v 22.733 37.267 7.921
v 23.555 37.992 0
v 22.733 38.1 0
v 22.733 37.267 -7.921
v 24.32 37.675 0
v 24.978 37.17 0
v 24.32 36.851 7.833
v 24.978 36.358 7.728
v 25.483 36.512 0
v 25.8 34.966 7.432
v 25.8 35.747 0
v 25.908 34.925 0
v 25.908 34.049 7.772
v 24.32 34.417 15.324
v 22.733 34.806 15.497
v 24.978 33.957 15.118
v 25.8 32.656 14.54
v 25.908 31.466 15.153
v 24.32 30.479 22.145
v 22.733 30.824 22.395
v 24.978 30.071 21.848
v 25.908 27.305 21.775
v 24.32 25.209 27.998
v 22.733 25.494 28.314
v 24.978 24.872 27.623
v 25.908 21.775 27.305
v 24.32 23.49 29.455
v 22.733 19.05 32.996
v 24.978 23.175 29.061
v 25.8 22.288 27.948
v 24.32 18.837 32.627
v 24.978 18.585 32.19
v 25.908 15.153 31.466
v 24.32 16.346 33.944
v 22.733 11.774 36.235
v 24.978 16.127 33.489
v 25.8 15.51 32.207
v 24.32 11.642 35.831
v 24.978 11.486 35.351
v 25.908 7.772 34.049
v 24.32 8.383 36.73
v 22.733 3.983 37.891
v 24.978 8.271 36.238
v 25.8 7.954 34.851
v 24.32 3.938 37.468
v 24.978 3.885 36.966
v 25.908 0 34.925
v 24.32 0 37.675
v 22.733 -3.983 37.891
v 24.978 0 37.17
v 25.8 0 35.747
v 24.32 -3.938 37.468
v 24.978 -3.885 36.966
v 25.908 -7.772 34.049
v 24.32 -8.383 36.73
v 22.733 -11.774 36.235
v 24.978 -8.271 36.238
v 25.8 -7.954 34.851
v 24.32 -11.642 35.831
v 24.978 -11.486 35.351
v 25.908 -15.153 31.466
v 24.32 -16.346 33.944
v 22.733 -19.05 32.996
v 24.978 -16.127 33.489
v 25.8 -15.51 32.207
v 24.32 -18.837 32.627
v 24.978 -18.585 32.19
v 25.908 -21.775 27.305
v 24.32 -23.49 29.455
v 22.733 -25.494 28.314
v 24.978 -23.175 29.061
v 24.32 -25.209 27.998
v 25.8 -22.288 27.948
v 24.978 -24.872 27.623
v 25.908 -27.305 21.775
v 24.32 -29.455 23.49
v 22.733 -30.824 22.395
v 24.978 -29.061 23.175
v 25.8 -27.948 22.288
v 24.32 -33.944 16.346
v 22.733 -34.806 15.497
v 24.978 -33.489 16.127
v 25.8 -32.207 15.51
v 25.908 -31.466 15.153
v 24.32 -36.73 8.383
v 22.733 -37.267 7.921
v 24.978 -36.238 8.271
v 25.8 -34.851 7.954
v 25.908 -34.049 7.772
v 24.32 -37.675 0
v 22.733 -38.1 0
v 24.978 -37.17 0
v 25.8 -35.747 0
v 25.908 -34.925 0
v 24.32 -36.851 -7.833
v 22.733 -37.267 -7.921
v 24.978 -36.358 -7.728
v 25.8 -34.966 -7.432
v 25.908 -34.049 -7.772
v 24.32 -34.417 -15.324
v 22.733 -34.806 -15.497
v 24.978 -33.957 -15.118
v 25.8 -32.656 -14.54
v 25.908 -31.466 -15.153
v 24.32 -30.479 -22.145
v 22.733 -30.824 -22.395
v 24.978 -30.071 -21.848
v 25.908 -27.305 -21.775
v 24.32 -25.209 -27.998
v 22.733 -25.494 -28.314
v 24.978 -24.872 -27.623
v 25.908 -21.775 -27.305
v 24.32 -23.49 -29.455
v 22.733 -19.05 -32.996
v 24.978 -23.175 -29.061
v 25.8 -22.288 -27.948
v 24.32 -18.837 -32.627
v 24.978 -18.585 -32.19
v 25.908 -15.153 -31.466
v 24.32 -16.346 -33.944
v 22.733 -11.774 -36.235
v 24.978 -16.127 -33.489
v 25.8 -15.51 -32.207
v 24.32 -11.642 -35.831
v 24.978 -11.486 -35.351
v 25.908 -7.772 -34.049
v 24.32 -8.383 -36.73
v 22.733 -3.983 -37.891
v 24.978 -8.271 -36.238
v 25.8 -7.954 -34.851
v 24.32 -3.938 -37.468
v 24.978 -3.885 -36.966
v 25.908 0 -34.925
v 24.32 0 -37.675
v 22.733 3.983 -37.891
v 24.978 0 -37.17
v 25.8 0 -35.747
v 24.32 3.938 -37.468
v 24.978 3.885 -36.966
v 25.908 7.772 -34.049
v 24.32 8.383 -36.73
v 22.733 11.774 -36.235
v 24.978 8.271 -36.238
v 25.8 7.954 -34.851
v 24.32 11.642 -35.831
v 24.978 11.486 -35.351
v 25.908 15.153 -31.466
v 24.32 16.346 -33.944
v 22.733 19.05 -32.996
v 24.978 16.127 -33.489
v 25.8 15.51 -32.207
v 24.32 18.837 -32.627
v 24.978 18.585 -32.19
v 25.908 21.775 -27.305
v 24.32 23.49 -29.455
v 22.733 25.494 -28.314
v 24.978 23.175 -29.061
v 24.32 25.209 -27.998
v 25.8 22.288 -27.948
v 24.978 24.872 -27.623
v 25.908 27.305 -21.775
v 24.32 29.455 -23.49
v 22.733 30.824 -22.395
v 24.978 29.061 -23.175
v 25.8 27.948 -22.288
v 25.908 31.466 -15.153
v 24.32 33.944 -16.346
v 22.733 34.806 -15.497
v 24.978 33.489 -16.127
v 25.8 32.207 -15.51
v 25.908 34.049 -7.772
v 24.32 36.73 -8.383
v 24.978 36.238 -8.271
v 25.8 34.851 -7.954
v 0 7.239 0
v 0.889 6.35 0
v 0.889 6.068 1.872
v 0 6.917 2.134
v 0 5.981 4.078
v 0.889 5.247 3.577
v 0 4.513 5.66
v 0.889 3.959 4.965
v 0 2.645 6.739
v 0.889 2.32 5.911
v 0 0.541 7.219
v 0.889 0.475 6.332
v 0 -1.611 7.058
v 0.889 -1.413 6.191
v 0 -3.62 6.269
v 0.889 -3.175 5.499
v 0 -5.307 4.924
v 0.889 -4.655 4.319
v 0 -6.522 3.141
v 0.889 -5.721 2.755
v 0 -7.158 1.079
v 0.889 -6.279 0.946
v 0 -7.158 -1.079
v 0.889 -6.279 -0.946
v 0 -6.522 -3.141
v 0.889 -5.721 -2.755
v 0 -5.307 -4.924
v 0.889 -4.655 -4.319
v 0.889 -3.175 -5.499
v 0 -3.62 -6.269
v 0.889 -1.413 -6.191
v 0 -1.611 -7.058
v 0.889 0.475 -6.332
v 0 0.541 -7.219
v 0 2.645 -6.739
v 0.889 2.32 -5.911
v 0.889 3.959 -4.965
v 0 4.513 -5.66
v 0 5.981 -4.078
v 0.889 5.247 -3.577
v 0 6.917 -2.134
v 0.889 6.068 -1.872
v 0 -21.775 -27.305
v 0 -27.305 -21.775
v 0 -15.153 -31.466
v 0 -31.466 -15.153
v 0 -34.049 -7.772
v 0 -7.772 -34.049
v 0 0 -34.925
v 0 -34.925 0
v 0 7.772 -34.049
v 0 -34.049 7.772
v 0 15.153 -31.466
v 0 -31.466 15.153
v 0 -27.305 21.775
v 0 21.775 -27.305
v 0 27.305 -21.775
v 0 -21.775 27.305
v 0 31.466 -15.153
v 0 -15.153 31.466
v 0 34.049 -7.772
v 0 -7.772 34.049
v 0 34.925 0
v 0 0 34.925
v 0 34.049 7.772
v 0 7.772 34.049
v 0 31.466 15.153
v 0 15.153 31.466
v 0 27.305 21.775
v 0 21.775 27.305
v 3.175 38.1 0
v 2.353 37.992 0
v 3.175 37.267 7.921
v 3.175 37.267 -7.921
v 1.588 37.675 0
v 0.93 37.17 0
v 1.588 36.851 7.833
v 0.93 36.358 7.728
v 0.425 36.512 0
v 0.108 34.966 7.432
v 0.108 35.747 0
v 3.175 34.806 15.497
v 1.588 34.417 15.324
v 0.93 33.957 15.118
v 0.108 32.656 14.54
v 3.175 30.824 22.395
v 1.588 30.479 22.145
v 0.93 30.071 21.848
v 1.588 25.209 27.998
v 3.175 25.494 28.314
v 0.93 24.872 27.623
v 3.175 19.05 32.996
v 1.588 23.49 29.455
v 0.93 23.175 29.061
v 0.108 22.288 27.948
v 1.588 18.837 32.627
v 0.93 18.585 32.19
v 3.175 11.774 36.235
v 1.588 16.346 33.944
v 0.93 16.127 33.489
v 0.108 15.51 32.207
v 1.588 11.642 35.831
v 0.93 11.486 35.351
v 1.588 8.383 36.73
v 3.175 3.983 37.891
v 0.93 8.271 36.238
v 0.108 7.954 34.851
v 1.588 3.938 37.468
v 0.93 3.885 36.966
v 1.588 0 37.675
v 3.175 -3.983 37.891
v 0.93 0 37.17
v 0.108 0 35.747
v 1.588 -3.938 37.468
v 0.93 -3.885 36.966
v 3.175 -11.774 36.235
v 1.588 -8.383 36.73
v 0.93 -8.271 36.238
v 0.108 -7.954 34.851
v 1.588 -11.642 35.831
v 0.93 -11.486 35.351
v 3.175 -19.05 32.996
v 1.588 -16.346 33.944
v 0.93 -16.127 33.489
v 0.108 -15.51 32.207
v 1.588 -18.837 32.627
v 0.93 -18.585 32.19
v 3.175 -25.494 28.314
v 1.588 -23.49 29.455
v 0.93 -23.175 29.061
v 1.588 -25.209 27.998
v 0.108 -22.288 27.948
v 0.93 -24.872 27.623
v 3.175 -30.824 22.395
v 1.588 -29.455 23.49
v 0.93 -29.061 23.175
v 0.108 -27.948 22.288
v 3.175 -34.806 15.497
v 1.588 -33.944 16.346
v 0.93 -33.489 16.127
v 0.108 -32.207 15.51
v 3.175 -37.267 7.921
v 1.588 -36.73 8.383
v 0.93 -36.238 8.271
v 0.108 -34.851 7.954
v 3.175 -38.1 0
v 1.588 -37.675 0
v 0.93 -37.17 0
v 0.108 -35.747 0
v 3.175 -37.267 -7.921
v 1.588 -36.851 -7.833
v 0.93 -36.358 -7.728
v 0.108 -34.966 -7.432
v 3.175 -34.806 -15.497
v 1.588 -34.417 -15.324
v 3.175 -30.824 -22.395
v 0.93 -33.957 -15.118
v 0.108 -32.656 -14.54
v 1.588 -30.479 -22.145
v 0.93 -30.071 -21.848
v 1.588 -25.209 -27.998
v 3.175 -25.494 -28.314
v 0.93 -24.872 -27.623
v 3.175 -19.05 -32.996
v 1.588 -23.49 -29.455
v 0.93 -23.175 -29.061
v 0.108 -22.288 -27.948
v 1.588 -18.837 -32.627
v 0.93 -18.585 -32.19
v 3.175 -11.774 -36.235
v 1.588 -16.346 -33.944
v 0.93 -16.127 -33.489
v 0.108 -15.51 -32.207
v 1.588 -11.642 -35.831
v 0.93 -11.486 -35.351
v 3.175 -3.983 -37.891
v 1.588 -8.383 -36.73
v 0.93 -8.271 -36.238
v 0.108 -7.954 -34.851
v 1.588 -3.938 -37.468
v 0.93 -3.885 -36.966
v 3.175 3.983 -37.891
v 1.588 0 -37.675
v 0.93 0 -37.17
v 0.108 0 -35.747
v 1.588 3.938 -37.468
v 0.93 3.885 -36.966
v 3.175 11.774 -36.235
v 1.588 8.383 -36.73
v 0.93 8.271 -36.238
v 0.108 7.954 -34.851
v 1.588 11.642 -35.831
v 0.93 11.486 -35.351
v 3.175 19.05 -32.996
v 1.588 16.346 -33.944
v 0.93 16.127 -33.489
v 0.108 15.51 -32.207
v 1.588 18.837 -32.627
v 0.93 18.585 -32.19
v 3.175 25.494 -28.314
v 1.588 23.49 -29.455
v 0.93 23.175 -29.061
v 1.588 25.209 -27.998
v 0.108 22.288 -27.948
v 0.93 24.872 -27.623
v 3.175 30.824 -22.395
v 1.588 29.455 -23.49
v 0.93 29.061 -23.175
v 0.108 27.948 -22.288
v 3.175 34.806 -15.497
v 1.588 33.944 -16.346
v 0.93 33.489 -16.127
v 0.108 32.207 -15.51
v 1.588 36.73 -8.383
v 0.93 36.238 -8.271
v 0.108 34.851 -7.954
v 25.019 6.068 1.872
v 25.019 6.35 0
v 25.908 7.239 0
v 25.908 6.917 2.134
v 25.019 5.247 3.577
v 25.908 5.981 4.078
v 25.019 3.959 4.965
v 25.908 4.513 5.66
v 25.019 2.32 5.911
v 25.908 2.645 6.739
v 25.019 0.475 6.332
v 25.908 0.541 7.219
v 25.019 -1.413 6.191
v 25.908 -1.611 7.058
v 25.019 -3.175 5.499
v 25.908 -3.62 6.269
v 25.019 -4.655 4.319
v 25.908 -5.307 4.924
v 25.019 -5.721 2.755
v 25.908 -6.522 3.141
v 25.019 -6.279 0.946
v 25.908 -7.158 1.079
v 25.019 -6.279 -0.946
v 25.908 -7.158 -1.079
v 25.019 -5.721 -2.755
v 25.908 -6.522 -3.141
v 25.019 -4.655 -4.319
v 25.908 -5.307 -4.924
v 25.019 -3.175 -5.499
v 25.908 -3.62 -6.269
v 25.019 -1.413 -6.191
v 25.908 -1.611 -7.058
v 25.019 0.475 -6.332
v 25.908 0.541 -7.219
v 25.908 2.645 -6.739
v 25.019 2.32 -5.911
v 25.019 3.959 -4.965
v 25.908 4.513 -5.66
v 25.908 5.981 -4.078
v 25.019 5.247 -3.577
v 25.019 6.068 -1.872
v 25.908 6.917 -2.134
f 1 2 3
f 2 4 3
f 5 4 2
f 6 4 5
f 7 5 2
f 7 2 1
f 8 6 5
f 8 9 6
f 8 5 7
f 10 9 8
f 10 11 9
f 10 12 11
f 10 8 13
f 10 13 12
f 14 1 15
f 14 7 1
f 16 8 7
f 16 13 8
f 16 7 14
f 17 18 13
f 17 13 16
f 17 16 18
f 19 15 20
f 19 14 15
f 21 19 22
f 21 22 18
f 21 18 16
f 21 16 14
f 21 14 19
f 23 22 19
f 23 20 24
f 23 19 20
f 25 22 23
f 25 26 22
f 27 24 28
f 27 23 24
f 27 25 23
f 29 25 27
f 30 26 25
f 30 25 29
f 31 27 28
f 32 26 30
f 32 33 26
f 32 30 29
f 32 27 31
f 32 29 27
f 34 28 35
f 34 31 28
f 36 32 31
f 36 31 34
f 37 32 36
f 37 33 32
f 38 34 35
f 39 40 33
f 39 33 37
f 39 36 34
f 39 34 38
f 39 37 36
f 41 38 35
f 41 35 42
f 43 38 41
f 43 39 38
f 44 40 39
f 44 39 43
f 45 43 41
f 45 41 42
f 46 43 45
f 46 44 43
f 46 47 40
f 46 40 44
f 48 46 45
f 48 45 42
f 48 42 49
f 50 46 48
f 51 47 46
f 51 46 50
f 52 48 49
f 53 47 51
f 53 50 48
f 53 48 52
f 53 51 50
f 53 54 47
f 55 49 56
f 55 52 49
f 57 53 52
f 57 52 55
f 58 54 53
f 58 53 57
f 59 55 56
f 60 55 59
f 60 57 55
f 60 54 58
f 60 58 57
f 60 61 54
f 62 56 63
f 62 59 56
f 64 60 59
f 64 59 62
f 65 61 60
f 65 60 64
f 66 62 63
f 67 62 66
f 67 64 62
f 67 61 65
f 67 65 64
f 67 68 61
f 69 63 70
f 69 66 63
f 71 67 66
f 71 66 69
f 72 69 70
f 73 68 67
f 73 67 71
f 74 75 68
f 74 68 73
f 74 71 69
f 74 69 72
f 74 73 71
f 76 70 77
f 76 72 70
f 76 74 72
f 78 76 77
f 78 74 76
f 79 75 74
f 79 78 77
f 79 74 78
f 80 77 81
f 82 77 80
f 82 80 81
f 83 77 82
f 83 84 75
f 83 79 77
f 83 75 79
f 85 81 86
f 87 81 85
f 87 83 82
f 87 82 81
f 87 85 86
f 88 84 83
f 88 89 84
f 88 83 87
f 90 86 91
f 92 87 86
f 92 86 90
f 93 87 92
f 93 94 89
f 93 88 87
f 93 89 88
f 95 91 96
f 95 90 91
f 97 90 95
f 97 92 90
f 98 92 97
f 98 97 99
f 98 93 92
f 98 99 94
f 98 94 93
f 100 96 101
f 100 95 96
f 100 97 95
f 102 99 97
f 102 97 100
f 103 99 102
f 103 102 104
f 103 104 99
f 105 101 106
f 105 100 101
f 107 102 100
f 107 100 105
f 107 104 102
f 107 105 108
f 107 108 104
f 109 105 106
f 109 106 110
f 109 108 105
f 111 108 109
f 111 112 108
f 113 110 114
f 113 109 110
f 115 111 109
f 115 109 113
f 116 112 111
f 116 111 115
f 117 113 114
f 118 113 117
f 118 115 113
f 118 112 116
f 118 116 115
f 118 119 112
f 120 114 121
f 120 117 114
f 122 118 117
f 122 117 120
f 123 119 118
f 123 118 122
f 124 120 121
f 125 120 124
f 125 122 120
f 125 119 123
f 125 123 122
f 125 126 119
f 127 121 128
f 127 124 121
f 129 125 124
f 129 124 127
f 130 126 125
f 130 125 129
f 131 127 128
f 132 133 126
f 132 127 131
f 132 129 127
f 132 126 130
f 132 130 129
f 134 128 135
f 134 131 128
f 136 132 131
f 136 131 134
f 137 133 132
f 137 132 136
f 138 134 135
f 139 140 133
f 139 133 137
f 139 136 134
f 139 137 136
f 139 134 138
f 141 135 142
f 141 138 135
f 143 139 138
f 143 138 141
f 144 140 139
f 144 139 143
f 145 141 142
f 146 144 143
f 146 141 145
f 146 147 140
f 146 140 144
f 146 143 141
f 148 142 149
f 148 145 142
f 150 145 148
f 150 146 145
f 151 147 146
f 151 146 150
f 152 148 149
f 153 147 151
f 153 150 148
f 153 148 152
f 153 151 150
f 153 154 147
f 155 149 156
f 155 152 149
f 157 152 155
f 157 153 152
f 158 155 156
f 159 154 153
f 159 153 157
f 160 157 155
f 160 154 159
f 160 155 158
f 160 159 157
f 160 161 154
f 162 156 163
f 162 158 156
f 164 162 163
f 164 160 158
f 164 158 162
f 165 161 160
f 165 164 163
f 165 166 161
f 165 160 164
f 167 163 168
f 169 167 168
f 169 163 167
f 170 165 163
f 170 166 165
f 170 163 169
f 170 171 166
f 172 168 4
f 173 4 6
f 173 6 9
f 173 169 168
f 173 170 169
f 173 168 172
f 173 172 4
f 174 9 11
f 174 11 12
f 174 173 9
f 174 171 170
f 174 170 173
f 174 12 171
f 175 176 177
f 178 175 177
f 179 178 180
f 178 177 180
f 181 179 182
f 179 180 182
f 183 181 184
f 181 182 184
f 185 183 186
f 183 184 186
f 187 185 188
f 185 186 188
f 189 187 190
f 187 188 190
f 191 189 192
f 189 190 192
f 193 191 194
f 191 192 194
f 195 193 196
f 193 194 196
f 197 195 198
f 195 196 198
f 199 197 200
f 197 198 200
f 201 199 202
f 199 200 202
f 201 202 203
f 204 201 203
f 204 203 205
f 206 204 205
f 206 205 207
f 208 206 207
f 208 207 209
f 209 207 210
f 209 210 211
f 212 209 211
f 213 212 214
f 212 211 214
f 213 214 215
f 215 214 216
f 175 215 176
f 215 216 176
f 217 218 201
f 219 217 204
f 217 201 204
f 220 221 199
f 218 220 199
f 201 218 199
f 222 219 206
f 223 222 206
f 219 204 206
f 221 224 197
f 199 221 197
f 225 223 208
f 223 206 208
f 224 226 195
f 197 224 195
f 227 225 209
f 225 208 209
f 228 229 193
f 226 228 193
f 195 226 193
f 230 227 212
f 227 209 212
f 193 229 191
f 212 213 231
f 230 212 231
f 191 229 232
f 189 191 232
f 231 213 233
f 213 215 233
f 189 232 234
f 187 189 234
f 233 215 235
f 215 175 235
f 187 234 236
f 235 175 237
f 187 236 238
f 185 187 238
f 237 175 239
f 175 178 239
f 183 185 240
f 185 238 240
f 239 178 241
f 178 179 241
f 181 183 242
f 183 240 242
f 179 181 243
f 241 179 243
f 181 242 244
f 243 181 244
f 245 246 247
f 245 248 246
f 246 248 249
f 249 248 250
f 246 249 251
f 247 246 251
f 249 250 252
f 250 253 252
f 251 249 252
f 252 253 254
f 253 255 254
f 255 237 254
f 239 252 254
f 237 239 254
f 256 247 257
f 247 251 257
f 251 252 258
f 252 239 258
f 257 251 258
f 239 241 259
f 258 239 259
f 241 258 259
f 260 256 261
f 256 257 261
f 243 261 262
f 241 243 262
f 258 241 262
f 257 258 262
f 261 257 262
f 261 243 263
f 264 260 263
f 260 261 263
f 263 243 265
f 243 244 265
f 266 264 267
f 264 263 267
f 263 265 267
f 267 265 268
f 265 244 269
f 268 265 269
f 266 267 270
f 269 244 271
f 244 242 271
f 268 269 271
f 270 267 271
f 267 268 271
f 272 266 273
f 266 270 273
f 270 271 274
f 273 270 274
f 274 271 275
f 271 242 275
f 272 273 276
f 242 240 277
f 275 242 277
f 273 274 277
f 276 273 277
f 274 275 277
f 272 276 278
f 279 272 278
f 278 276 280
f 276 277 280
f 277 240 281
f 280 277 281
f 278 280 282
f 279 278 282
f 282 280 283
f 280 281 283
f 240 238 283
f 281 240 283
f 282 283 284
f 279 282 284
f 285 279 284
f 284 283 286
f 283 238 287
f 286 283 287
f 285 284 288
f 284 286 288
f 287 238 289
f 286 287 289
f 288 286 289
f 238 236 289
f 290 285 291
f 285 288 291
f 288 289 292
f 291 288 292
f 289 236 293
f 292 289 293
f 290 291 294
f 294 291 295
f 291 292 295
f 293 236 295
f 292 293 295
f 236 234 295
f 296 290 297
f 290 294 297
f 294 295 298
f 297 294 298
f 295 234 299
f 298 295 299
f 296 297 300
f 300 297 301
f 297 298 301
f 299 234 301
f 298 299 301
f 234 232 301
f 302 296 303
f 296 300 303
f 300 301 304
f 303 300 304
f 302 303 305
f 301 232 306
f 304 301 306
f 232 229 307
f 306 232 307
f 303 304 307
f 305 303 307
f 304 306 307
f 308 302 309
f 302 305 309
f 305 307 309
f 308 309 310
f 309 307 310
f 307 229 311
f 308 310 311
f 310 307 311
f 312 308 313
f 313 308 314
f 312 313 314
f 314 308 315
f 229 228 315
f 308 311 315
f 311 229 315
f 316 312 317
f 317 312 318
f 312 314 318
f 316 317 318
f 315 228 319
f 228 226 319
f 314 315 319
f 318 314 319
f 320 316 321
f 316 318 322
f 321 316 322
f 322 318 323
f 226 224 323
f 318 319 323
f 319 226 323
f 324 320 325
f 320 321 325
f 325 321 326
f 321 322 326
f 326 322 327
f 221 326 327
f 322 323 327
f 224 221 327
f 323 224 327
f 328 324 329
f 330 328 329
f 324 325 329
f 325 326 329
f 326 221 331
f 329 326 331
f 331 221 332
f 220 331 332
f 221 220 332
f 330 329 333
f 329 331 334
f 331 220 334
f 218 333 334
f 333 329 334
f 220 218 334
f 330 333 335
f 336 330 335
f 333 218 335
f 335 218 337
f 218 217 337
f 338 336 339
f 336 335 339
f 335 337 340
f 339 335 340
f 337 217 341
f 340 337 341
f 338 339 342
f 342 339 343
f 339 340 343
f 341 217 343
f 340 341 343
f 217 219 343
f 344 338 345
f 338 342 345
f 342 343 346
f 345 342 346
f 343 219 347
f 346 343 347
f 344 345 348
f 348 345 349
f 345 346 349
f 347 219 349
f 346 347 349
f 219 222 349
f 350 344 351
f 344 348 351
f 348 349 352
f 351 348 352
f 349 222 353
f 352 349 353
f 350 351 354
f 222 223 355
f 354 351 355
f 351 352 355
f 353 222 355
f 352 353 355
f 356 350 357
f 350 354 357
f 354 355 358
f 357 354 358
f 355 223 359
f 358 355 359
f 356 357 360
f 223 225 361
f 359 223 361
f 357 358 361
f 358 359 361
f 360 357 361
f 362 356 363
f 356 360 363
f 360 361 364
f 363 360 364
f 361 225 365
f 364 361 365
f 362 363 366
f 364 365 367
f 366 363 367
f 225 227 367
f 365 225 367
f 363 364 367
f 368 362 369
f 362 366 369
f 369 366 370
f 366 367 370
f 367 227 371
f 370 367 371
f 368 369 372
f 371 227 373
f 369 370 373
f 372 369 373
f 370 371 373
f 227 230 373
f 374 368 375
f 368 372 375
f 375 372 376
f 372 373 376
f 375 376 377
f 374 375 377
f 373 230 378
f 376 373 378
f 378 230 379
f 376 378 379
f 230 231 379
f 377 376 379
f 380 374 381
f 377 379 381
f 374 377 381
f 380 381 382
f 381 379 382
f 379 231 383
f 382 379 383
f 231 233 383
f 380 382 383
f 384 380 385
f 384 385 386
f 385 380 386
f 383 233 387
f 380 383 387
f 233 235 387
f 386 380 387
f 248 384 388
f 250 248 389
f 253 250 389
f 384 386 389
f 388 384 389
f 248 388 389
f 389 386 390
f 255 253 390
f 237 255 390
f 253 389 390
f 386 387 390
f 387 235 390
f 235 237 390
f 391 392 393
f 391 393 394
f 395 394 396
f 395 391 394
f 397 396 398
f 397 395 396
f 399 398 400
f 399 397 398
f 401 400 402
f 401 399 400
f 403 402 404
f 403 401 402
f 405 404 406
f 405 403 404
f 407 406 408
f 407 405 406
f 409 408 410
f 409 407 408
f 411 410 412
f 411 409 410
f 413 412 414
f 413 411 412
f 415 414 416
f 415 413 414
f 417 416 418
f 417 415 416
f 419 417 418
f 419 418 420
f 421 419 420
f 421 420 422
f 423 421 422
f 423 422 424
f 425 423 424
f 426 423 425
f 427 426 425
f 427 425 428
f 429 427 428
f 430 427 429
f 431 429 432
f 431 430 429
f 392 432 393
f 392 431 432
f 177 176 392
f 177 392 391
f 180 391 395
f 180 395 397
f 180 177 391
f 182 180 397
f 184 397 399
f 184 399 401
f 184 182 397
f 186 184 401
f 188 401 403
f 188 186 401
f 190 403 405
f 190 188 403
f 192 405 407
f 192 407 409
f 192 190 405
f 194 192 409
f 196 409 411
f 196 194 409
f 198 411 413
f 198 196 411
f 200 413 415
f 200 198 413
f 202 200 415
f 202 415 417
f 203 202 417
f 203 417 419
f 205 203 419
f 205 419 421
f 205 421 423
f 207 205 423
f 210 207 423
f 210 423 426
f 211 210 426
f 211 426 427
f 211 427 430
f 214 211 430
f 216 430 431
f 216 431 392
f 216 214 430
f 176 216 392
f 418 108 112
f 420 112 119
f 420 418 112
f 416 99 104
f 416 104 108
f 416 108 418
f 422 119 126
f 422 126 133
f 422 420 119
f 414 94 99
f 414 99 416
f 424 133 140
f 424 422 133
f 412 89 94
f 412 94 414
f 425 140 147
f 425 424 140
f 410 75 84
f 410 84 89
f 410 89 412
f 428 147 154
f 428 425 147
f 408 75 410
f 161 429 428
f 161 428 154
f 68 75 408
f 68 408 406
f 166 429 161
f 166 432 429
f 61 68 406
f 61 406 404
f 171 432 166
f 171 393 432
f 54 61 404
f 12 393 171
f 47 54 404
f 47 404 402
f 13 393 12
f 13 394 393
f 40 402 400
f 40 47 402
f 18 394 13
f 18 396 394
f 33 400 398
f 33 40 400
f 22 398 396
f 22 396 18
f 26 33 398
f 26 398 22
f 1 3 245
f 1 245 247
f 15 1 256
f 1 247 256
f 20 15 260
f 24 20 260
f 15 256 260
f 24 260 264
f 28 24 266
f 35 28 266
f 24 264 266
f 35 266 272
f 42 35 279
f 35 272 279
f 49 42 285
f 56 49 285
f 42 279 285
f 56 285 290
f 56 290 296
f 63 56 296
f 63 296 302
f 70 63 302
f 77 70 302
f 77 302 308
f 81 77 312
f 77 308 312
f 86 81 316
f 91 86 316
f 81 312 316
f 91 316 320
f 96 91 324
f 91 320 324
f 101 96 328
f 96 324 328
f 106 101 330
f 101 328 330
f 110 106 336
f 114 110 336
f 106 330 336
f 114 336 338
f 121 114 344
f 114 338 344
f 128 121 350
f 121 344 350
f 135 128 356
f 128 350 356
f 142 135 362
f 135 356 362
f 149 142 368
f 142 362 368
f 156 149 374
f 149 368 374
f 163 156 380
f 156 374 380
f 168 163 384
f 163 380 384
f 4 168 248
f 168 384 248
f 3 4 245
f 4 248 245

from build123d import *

# Parameters (mm, degrees)
F0_R     = 38.1
F0_R_2   = 6.35
F1_DEPTH = 25.908
F2_R     = 3.175
F3_SIZE  = 0.889


with BuildPart() as f1:
    # F0 (on Right) → F1 (new body)
    with BuildSketch(Plane.YZ):
        Circle(F0_R)
        Circle(F0_R_2, mode=Mode.SUBTRACT)
    extrude(amount=F1_DEPTH)

    # F2
    f2_edges = [f1.edges().sort_by_distance(p)[0] for p in [
        (12.954, 38.1, 0),
        (0, -38.1, 0),
        (25.908, -38.1, 0),
    ]]
    fillet(f2_edges, radius=F2_R)

    # F3
    f3_edges = [f1.edges().sort_by_distance(p)[0] for p in [
        (12.954, 6.35, 0),
        (0, -6.35, 0),
        (25.908, -6.35, 0),
    ]]
    chamfer(f3_edges, length=F3_SIZE)


solid = f1.part
